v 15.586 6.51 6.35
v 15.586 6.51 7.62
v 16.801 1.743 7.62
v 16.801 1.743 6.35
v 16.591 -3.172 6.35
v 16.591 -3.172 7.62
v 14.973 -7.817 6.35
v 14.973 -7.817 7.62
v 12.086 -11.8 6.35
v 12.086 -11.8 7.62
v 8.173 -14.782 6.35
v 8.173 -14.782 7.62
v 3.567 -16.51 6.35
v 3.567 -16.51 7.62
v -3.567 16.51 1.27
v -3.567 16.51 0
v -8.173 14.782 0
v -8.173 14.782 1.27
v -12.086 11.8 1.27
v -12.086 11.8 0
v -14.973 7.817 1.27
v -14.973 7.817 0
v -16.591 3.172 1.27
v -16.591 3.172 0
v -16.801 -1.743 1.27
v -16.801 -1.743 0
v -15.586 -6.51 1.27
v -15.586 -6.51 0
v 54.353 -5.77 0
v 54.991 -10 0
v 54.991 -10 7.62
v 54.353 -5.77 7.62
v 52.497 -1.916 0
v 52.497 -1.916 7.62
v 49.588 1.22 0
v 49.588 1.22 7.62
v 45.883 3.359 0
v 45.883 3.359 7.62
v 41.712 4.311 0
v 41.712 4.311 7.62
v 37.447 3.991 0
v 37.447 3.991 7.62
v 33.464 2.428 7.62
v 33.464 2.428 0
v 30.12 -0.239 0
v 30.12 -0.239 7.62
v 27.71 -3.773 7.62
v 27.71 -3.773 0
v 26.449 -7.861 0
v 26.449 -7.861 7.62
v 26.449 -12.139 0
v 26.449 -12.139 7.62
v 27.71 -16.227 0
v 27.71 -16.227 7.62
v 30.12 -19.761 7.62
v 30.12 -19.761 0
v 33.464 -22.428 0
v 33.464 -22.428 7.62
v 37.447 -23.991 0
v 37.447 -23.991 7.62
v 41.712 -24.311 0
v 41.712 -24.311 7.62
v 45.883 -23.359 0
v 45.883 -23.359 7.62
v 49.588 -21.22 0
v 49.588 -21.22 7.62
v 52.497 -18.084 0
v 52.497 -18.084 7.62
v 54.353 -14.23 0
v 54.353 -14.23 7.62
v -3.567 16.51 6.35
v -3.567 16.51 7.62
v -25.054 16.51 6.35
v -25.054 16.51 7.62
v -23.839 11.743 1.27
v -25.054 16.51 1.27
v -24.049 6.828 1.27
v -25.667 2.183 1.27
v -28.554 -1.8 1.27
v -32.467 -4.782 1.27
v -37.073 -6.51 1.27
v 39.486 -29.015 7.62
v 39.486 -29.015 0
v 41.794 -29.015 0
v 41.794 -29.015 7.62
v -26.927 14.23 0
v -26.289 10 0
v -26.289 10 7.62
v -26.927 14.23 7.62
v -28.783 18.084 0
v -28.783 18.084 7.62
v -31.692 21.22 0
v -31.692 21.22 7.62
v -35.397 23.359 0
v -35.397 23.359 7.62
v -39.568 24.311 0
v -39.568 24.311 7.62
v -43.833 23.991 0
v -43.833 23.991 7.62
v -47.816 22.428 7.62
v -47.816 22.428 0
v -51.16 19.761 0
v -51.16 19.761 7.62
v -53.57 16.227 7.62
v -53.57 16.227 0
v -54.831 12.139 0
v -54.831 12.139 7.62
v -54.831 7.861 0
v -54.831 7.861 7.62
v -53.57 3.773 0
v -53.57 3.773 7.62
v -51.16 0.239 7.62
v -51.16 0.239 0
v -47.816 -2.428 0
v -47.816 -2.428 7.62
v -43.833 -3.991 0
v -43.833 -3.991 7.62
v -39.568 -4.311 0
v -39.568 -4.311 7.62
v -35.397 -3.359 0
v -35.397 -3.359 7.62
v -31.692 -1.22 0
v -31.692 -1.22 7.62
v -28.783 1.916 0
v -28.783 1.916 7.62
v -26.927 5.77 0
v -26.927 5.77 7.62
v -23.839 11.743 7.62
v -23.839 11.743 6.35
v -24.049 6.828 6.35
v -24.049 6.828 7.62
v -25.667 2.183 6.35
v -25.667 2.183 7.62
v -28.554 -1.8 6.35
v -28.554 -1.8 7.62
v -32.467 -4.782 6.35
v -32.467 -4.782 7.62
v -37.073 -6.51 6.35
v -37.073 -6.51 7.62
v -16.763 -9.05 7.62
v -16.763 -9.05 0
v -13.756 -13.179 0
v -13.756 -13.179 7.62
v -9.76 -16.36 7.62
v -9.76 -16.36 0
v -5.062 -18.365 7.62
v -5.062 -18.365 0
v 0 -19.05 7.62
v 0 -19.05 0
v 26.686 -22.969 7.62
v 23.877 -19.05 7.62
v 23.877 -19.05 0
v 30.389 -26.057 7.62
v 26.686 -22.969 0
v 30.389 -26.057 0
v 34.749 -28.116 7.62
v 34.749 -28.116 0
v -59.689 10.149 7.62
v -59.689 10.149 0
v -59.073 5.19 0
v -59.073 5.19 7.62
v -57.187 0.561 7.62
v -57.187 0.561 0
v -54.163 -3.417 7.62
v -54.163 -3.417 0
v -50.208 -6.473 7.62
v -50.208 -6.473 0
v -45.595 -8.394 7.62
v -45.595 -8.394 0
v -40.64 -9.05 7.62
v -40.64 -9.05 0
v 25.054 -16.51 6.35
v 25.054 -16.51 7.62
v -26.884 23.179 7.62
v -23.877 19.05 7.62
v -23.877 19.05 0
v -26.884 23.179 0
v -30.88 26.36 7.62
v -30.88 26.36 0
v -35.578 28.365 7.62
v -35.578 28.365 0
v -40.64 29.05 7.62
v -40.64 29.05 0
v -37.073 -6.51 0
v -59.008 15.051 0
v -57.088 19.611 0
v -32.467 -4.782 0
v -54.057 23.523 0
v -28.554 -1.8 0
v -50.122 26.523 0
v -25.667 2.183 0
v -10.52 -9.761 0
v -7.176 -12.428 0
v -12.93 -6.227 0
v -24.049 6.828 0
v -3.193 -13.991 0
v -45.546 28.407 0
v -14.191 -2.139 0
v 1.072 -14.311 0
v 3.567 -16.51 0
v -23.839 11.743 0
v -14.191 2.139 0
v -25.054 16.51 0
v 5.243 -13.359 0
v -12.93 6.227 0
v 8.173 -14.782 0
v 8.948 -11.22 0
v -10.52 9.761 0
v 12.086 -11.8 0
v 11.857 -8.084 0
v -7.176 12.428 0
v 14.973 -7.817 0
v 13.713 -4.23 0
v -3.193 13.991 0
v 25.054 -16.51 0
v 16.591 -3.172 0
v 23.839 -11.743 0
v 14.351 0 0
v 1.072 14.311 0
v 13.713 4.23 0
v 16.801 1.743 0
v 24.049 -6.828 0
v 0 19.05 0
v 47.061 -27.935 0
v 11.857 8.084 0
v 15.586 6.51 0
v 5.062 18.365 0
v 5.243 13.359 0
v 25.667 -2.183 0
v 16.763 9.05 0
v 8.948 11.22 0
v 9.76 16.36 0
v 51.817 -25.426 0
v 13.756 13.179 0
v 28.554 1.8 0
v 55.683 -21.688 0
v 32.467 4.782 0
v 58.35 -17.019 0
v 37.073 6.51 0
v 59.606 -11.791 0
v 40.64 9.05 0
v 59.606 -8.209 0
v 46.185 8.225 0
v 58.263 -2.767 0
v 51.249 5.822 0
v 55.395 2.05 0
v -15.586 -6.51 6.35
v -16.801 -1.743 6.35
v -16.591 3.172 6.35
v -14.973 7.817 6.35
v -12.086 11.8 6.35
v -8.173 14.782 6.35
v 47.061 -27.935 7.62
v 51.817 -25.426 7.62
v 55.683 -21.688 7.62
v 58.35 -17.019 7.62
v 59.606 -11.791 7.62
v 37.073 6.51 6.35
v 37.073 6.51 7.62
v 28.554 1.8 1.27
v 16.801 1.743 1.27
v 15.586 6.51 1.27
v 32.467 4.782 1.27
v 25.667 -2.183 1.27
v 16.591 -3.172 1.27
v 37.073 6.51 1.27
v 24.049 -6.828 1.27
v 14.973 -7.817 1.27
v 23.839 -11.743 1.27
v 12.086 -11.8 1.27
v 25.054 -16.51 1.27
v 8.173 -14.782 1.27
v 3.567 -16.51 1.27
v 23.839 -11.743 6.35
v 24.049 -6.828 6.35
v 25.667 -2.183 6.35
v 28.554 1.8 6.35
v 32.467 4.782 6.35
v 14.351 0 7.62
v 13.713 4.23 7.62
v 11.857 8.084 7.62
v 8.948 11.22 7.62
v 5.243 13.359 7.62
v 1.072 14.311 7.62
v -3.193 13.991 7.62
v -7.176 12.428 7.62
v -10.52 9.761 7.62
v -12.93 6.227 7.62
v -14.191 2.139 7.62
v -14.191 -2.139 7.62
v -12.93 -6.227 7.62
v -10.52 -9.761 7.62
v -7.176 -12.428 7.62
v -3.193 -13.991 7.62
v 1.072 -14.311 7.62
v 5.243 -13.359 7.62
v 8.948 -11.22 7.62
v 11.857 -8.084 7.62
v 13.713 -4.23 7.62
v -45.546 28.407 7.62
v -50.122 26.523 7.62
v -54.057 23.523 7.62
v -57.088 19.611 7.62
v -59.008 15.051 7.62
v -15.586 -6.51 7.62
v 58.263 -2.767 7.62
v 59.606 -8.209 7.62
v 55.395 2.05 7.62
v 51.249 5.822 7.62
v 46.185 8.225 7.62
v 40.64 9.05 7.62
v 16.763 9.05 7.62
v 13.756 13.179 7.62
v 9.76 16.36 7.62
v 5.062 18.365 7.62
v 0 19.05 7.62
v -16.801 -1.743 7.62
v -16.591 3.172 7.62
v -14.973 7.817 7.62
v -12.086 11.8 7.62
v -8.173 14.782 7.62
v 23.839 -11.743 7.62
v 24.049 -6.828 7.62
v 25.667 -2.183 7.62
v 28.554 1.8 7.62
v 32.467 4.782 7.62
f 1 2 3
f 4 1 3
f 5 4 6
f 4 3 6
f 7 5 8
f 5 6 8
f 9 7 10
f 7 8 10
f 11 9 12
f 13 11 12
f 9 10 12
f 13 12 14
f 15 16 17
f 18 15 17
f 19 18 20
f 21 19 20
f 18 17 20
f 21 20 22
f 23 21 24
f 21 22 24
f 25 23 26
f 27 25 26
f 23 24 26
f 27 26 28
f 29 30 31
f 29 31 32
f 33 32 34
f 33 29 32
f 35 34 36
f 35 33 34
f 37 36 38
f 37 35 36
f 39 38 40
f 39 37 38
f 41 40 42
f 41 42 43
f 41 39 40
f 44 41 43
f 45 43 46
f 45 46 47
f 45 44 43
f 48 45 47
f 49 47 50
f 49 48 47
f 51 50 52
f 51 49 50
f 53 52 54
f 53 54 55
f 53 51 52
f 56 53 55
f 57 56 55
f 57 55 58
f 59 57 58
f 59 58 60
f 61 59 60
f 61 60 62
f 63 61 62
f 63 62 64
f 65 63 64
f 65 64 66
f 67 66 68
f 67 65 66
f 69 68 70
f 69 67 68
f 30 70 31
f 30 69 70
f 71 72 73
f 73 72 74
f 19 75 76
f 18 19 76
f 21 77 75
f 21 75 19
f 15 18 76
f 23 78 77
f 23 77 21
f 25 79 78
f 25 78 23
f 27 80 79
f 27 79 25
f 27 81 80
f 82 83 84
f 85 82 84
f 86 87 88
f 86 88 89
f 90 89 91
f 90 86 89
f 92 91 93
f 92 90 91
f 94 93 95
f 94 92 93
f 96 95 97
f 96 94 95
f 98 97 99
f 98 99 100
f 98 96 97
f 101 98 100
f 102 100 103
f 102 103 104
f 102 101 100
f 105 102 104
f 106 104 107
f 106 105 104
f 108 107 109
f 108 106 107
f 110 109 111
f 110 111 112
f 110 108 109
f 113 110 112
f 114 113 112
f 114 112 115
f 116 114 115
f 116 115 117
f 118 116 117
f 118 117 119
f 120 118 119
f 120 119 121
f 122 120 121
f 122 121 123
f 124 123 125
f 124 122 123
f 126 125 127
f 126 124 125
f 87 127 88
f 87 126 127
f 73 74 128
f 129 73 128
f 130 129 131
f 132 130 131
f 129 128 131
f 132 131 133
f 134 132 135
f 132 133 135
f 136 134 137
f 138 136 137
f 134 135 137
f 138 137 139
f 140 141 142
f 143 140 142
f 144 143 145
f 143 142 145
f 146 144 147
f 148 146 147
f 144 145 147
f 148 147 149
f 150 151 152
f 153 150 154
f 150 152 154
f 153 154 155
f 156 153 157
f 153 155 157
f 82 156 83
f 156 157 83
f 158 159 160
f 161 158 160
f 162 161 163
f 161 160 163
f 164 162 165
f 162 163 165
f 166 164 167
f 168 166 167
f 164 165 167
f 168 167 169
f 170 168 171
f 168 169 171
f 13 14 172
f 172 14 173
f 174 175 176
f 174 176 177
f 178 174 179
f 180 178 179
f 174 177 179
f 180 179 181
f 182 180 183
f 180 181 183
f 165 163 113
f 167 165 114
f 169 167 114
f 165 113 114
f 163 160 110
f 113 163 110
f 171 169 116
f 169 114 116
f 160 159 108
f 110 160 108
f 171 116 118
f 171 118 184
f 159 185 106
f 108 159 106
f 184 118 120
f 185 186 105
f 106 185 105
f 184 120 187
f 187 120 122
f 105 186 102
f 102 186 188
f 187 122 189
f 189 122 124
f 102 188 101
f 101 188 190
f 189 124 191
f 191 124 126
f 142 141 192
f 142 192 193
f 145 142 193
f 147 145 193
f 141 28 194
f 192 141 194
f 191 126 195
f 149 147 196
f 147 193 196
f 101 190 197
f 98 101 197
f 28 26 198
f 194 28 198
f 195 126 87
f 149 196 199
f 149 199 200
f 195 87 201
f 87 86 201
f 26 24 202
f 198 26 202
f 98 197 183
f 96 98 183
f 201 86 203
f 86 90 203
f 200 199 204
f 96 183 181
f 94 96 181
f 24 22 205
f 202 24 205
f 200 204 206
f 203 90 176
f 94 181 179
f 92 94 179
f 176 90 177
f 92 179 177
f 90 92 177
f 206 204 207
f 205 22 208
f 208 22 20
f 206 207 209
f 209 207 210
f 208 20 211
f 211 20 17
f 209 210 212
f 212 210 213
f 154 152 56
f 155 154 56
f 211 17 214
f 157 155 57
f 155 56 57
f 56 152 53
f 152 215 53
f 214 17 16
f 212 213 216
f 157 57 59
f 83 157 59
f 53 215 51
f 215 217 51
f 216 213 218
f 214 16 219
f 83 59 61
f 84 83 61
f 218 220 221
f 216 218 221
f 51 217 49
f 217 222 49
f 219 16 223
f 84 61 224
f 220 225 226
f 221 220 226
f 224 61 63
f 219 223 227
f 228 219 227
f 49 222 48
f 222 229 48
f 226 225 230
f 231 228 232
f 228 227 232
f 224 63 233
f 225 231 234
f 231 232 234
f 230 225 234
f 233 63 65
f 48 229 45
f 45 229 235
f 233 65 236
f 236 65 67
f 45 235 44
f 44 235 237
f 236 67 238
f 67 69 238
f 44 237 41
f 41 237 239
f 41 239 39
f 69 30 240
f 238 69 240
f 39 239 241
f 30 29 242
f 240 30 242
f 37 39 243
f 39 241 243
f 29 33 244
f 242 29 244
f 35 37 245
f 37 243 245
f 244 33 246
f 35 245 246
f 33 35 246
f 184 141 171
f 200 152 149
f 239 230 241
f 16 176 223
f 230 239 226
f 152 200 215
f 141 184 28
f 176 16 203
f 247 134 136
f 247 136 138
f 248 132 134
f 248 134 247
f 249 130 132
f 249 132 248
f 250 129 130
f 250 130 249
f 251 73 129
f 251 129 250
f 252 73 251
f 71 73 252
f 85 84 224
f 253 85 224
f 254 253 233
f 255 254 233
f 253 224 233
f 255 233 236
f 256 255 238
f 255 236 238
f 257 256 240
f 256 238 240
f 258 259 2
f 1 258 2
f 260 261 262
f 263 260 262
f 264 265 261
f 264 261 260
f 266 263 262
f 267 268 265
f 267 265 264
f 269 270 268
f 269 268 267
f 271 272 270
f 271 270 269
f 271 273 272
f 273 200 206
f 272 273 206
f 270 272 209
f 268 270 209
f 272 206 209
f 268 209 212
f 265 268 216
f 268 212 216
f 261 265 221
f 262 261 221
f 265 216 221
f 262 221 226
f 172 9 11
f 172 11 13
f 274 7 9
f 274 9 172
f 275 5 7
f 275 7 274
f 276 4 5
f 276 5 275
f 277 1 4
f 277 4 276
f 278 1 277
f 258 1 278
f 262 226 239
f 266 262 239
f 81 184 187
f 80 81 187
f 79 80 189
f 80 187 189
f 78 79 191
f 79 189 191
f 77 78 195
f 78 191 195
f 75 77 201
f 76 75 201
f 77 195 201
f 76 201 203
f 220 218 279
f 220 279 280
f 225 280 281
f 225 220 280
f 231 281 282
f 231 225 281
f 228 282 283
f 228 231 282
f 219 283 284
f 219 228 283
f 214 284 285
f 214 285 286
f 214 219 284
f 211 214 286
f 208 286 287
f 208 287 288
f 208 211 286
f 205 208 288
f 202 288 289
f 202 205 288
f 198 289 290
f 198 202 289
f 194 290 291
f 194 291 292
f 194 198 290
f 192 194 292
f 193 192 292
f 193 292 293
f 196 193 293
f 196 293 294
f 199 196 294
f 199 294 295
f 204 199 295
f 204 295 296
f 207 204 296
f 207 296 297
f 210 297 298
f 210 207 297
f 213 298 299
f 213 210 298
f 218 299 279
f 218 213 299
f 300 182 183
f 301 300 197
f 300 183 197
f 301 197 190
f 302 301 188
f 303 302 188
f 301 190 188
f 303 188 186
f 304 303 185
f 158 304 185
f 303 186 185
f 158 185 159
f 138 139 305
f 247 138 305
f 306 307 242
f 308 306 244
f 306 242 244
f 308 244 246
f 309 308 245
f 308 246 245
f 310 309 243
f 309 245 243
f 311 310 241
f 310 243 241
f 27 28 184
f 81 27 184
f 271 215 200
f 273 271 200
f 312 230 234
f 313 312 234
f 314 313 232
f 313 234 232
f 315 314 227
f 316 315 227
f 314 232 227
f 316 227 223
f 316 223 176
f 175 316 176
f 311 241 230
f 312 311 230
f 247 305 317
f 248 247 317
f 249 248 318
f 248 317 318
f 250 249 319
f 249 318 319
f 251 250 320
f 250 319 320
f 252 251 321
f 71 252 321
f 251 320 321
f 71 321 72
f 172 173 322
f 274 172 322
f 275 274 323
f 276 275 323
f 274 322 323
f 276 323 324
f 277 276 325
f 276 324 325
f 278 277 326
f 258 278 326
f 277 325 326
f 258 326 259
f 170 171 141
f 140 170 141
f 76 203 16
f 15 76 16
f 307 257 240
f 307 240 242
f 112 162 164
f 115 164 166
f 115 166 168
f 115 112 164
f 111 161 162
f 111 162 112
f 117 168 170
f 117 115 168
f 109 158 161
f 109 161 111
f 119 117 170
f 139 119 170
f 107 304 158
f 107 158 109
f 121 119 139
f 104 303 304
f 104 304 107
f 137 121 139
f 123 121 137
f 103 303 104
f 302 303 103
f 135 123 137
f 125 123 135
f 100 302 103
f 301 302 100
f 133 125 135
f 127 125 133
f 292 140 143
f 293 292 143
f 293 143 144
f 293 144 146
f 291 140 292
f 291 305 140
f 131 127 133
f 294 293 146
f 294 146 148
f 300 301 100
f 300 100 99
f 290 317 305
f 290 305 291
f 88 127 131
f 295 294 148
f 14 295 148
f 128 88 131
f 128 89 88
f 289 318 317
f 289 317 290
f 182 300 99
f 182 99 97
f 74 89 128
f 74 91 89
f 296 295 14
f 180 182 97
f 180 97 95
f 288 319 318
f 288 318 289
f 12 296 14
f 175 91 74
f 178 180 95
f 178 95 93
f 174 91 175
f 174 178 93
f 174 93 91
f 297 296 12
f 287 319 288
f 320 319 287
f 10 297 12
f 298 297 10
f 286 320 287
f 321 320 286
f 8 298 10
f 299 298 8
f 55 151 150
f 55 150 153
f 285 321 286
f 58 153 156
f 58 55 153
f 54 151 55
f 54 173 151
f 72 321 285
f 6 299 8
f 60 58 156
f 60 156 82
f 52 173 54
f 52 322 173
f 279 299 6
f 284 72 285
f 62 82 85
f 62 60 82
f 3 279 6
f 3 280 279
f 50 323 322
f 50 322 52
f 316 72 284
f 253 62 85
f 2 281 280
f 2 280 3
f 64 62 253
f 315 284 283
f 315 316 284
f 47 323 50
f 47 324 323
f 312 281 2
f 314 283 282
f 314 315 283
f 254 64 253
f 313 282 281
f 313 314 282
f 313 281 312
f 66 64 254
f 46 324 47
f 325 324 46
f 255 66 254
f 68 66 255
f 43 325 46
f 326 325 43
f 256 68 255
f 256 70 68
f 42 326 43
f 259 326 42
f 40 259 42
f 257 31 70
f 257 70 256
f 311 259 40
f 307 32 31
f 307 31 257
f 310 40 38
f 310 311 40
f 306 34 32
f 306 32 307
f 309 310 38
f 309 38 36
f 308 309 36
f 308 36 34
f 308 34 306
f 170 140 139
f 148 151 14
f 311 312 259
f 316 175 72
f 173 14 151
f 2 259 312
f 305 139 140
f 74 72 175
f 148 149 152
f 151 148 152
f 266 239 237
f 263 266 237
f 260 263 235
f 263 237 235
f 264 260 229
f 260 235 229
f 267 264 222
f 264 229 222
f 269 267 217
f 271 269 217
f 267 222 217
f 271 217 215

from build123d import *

# Parameters (mm, degrees)
F0_R        = 14.351
F1_DEPTH    = 7.62
F2_T        = 2.54
F2_T3_DEPTH = 12.7
F4_DEPTH    = 7.62
F5_DEPTH    = 1.27
F7_DEPTH    = 1.27


# Not quite as in the source:
# - a shell that OpenCascade refuses in one call is made with other operations: the cavity is built on its own and cut out


with BuildPart() as f1:
    # F0 (on Top) → F1 (new body)
    with BuildSketch(Plane.XY):
        with BuildLine():
            ThreePointArc((-40.64, -9.05), (-27.1696158184, -3.4703841816), (-21.59, 10))
            ThreePointArc((-21.59, 10), (-22.1705835176, 14.6672427406), (-23.8769453858, 19.05))
            ThreePointArc((-23.8769453858, 19.05), (-30.880389352, 26.3600886306), (-40.64, 29.05))
            ThreePointArc((-40.64, 29.05), (-54.0574684375, 23.5230928684), (-59.6894143559, 10.1493743547))
            ThreePointArc((-59.6894143559, 10.1493743547), (-54.1630928684, -3.4174684375), (-40.64, -9.05))
        make_face()
        with Locations((-40.64, 10)):
            Circle(F0_R, mode=Mode.SUBTRACT)
        with BuildLine():
            ThreePointArc((-23.8769453858, 19.05), (-22.1705835176, 14.6672427406), (-21.59, 10))
            ThreePointArc((-21.59, 10), (-27.1696158184, -3.4703841816), (-40.64, -9.05))
            Line((-40.64, -9.05), (-16.7630546142, -9.05))
            ThreePointArc((-16.7630546142, -9.05), (-16.3600886306, 9.759610648), (0, 19.05))
            Line((0, 19.05), (-23.8769453858, 19.05))
        make_face()
        with BuildLine():
            ThreePointArc((16.7630546142, 9.05), (9.759610648, 16.3600886306), (0, 19.05))
            ThreePointArc((0, 19.05), (-16.3600886306, 9.759610648), (-16.7630546142, -9.05))
            ThreePointArc((-16.7630546142, -9.05), (-9.759610648, -16.3600886306), (0, -19.05))
            ThreePointArc((0, -19.05), (13.4703841816, -13.4703841816), (19.05, 0))
            ThreePointArc((19.05, 0), (18.4694164824, 4.6672427406), (16.7630546142, 9.05))
        make_face()
        Circle(F0_R, mode=Mode.SUBTRACT)
        with BuildLine():
            Line((40.64, 9.05), (16.7630546142, 9.05))
            ThreePointArc((16.7630546142, 9.05), (18.4694164824, 4.6672427406), (19.05, 0))
            ThreePointArc((19.05, 0), (13.4703841816, -13.4703841816), (0, -19.05))
            Line((0, -19.05), (23.8769453858, -19.05))
            ThreePointArc((23.8769453858, -19.05), (24.2799113694, -0.240389352), (40.64, 9.05))
        make_face()
        with BuildLine():
            ThreePointArc((59.6056254338, -8.2090360401), (53.4615567808, 4.0893641346), (40.64, 9.05))
            ThreePointArc((40.64, 9.05), (24.2799113694, -0.240389352), (23.8769453858, -19.05))
            ThreePointArc((23.8769453858, -19.05), (30.3891760199, -26.0568710442), (39.4861384834, -29.0150231028))
            Line((39.4861384834, -29.0150231028), (41.7938615166, -29.0150231028))
            ThreePointArc((41.7938615166, -29.0150231028), (53.8825636539, -23.6944152074), (59.6056254338, -11.7909639599))
            Line((59.6056254338, -11.7909639599), (59.6056254338, -8.2090360401))
        make_face()
        with Locations((40.64, -10)):
            Circle(F0_R, mode=Mode.SUBTRACT)
    extrude(amount=F1_DEPTH)

    # F2: shell of thickness 2.54, made by hand


with BuildPart() as f2_core1:
    # F2_t2: copy of F1
    add(f1.part)

    # the walls: a layer under each face that stays
    f2_faces = [f2_core1.faces().sort_by_distance(p)[0] for p in [
        (-57.0000886306, 19.759610648, 3.81),
        (-28.7015273071, -9.05, 3.81),
        (-9.759610648, -16.3600886306, 3.81),
        (11.9384726929, -19.05, 3.81),
        (30.3891760199, -26.0568710442, 3.81),
        (40.64, -29.0150231028, 3.81),
        (53.8825636539, -23.6944152074, 3.81),
        (59.6056254338, -10, 3.81),
        (53.4615567808, 4.0893641346, 3.81),
        (28.7015273071, 9.05, 3.81),
        (9.759610648, 16.3600886306, 3.81),
        (-11.9384726929, 19.05, 3.81),
        (-54.991, 10, 3.81),
        (-14.351, 0, 3.81),
        (26.289, -10, 3.81),
        (-51.1688838976, 0.0174884486, 0),
    ]]
    thicken(f2_faces, amount=-F2_T, mode=Mode.SUBTRACT)

    # F2_s4 → F2_t3 (cut)
    with BuildSketch(Plane.XY.offset(-2.54)):
        Polygon((-23.8545946463, 19.0874666667), (-26.1120193343, 17.8433333333), (-25.3921823509, 16.51), (-23.8769453858, 16.51), align=None)
        Polygon((-16.7854053537, -9.0874666667), (-16.7630546142, -6.51), (-15.2478176491, -6.51), (-14.5279806657, -7.8433333333), align=None)
        Polygon((23.8545946463, -19.0874666667), (23.8769453858, -16.51), (25.3921823509, -16.51), (26.1120193343, -17.8433333333), align=None)
        Polygon((16.7854053537, 9.0874666667), (16.7630546142, 6.51), (15.2478176491, 6.51), (14.5279806657, 7.8433333333), align=None)
    extrude(amount=F2_T3_DEPTH, mode=Mode.SUBTRACT)


with BuildPart() as f1_1:
    add(f1.part)

    # what is left inside the walls is the cavity
    f2_cavity = [f2_core1.part.solids().sort_by_distance(p)[0] for p in [
        (-20.32, 1.163333, 7.5946),
        (20.32, -8.836667, 7.5946),
    ]]
    add(f2_cavity, mode=Mode.SUBTRACT)

    # F3 (on face) → F4 (join)
    with BuildSketch(Plane.XY.offset(7.62)):
        with BuildLine():
            ThreePointArc((-15.5860765108, -6.51), (-14.9730845713, 7.8174560709), (-3.5673212639, 16.51))
            Line((-3.5673212639, 16.51), (-25.0539234892, 16.51))
            ThreePointArc((-25.0539234892, 16.51), (-25.6669154287, 2.1825439291), (-37.0726787361, -6.51))
            Line((-37.0726787361, -6.51), (-15.5860765108, -6.51))
        make_face()
        with BuildLine():
            ThreePointArc((25.0539234892, -16.51), (25.6669154287, -2.1825439291), (37.0726787361, 6.51))
            Line((37.0726787361, 6.51), (15.5860765108, 6.51))
            ThreePointArc((15.5860765108, 6.51), (14.9730845713, -7.8174560709), (3.5673212639, -16.51))
            Line((3.5673212639, -16.51), (25.0539234892, -16.51))
        make_face()
    extrude(amount=-F4_DEPTH)

    # F3 (on face) → F5 (cut)
    with BuildSketch(Plane.XY.offset(7.62)):
        with BuildLine():
            ThreePointArc((-15.5860765108, -6.51), (-14.9730845713, 7.8174560709), (-3.5673212639, 16.51))
            Line((-3.5673212639, 16.51), (-25.0539234892, 16.51))
            ThreePointArc((-25.0539234892, 16.51), (-25.6669154287, 2.1825439291), (-37.0726787361, -6.51))
            Line((-37.0726787361, -6.51), (-15.5860765108, -6.51))
        make_face()
        with BuildLine():
            ThreePointArc((25.0539234892, -16.51), (25.6669154287, -2.1825439291), (37.0726787361, 6.51))
            Line((37.0726787361, 6.51), (15.5860765108, 6.51))
            ThreePointArc((15.5860765108, 6.51), (14.9730845713, -7.8174560709), (3.5673212639, -16.51))
            Line((3.5673212639, -16.51), (25.0539234892, -16.51))
        make_face()
    extrude(amount=-F5_DEPTH, mode=Mode.SUBTRACT)

    # F6 (on face) → F7 (cut)
    with BuildSketch(Plane(origin=(0, 0, 0), x_dir=(1, 0, 0), z_dir=(0, 0, -1))):
        with BuildLine():
            Line((-15.5860765108, 6.51), (-37.0726787361, 6.51))
            ThreePointArc((-37.0726787361, 6.51), (-25.6669154287, -2.1825439291), (-25.0539234892, -16.51))
            Line((-25.0539234892, -16.51), (-3.5673212639, -16.51))
            ThreePointArc((-3.5673212639, -16.51), (-14.9730845713, -7.8174560709), (-15.5860765108, 6.51))
        make_face()
        with BuildLine():
            Line((15.5860765108, -6.51), (37.0726787361, -6.51))
            ThreePointArc((37.0726787361, -6.51), (25.6669154287, 2.1825439291), (25.0539234892, 16.51))
            Line((25.0539234892, 16.51), (3.5673212639, 16.51))
            ThreePointArc((3.5673212639, 16.51), (14.9730845713, 7.8174560709), (15.5860765108, -6.51))
        make_face()
    extrude(amount=-F7_DEPTH, mode=Mode.SUBTRACT)


solid = f1_1.part
